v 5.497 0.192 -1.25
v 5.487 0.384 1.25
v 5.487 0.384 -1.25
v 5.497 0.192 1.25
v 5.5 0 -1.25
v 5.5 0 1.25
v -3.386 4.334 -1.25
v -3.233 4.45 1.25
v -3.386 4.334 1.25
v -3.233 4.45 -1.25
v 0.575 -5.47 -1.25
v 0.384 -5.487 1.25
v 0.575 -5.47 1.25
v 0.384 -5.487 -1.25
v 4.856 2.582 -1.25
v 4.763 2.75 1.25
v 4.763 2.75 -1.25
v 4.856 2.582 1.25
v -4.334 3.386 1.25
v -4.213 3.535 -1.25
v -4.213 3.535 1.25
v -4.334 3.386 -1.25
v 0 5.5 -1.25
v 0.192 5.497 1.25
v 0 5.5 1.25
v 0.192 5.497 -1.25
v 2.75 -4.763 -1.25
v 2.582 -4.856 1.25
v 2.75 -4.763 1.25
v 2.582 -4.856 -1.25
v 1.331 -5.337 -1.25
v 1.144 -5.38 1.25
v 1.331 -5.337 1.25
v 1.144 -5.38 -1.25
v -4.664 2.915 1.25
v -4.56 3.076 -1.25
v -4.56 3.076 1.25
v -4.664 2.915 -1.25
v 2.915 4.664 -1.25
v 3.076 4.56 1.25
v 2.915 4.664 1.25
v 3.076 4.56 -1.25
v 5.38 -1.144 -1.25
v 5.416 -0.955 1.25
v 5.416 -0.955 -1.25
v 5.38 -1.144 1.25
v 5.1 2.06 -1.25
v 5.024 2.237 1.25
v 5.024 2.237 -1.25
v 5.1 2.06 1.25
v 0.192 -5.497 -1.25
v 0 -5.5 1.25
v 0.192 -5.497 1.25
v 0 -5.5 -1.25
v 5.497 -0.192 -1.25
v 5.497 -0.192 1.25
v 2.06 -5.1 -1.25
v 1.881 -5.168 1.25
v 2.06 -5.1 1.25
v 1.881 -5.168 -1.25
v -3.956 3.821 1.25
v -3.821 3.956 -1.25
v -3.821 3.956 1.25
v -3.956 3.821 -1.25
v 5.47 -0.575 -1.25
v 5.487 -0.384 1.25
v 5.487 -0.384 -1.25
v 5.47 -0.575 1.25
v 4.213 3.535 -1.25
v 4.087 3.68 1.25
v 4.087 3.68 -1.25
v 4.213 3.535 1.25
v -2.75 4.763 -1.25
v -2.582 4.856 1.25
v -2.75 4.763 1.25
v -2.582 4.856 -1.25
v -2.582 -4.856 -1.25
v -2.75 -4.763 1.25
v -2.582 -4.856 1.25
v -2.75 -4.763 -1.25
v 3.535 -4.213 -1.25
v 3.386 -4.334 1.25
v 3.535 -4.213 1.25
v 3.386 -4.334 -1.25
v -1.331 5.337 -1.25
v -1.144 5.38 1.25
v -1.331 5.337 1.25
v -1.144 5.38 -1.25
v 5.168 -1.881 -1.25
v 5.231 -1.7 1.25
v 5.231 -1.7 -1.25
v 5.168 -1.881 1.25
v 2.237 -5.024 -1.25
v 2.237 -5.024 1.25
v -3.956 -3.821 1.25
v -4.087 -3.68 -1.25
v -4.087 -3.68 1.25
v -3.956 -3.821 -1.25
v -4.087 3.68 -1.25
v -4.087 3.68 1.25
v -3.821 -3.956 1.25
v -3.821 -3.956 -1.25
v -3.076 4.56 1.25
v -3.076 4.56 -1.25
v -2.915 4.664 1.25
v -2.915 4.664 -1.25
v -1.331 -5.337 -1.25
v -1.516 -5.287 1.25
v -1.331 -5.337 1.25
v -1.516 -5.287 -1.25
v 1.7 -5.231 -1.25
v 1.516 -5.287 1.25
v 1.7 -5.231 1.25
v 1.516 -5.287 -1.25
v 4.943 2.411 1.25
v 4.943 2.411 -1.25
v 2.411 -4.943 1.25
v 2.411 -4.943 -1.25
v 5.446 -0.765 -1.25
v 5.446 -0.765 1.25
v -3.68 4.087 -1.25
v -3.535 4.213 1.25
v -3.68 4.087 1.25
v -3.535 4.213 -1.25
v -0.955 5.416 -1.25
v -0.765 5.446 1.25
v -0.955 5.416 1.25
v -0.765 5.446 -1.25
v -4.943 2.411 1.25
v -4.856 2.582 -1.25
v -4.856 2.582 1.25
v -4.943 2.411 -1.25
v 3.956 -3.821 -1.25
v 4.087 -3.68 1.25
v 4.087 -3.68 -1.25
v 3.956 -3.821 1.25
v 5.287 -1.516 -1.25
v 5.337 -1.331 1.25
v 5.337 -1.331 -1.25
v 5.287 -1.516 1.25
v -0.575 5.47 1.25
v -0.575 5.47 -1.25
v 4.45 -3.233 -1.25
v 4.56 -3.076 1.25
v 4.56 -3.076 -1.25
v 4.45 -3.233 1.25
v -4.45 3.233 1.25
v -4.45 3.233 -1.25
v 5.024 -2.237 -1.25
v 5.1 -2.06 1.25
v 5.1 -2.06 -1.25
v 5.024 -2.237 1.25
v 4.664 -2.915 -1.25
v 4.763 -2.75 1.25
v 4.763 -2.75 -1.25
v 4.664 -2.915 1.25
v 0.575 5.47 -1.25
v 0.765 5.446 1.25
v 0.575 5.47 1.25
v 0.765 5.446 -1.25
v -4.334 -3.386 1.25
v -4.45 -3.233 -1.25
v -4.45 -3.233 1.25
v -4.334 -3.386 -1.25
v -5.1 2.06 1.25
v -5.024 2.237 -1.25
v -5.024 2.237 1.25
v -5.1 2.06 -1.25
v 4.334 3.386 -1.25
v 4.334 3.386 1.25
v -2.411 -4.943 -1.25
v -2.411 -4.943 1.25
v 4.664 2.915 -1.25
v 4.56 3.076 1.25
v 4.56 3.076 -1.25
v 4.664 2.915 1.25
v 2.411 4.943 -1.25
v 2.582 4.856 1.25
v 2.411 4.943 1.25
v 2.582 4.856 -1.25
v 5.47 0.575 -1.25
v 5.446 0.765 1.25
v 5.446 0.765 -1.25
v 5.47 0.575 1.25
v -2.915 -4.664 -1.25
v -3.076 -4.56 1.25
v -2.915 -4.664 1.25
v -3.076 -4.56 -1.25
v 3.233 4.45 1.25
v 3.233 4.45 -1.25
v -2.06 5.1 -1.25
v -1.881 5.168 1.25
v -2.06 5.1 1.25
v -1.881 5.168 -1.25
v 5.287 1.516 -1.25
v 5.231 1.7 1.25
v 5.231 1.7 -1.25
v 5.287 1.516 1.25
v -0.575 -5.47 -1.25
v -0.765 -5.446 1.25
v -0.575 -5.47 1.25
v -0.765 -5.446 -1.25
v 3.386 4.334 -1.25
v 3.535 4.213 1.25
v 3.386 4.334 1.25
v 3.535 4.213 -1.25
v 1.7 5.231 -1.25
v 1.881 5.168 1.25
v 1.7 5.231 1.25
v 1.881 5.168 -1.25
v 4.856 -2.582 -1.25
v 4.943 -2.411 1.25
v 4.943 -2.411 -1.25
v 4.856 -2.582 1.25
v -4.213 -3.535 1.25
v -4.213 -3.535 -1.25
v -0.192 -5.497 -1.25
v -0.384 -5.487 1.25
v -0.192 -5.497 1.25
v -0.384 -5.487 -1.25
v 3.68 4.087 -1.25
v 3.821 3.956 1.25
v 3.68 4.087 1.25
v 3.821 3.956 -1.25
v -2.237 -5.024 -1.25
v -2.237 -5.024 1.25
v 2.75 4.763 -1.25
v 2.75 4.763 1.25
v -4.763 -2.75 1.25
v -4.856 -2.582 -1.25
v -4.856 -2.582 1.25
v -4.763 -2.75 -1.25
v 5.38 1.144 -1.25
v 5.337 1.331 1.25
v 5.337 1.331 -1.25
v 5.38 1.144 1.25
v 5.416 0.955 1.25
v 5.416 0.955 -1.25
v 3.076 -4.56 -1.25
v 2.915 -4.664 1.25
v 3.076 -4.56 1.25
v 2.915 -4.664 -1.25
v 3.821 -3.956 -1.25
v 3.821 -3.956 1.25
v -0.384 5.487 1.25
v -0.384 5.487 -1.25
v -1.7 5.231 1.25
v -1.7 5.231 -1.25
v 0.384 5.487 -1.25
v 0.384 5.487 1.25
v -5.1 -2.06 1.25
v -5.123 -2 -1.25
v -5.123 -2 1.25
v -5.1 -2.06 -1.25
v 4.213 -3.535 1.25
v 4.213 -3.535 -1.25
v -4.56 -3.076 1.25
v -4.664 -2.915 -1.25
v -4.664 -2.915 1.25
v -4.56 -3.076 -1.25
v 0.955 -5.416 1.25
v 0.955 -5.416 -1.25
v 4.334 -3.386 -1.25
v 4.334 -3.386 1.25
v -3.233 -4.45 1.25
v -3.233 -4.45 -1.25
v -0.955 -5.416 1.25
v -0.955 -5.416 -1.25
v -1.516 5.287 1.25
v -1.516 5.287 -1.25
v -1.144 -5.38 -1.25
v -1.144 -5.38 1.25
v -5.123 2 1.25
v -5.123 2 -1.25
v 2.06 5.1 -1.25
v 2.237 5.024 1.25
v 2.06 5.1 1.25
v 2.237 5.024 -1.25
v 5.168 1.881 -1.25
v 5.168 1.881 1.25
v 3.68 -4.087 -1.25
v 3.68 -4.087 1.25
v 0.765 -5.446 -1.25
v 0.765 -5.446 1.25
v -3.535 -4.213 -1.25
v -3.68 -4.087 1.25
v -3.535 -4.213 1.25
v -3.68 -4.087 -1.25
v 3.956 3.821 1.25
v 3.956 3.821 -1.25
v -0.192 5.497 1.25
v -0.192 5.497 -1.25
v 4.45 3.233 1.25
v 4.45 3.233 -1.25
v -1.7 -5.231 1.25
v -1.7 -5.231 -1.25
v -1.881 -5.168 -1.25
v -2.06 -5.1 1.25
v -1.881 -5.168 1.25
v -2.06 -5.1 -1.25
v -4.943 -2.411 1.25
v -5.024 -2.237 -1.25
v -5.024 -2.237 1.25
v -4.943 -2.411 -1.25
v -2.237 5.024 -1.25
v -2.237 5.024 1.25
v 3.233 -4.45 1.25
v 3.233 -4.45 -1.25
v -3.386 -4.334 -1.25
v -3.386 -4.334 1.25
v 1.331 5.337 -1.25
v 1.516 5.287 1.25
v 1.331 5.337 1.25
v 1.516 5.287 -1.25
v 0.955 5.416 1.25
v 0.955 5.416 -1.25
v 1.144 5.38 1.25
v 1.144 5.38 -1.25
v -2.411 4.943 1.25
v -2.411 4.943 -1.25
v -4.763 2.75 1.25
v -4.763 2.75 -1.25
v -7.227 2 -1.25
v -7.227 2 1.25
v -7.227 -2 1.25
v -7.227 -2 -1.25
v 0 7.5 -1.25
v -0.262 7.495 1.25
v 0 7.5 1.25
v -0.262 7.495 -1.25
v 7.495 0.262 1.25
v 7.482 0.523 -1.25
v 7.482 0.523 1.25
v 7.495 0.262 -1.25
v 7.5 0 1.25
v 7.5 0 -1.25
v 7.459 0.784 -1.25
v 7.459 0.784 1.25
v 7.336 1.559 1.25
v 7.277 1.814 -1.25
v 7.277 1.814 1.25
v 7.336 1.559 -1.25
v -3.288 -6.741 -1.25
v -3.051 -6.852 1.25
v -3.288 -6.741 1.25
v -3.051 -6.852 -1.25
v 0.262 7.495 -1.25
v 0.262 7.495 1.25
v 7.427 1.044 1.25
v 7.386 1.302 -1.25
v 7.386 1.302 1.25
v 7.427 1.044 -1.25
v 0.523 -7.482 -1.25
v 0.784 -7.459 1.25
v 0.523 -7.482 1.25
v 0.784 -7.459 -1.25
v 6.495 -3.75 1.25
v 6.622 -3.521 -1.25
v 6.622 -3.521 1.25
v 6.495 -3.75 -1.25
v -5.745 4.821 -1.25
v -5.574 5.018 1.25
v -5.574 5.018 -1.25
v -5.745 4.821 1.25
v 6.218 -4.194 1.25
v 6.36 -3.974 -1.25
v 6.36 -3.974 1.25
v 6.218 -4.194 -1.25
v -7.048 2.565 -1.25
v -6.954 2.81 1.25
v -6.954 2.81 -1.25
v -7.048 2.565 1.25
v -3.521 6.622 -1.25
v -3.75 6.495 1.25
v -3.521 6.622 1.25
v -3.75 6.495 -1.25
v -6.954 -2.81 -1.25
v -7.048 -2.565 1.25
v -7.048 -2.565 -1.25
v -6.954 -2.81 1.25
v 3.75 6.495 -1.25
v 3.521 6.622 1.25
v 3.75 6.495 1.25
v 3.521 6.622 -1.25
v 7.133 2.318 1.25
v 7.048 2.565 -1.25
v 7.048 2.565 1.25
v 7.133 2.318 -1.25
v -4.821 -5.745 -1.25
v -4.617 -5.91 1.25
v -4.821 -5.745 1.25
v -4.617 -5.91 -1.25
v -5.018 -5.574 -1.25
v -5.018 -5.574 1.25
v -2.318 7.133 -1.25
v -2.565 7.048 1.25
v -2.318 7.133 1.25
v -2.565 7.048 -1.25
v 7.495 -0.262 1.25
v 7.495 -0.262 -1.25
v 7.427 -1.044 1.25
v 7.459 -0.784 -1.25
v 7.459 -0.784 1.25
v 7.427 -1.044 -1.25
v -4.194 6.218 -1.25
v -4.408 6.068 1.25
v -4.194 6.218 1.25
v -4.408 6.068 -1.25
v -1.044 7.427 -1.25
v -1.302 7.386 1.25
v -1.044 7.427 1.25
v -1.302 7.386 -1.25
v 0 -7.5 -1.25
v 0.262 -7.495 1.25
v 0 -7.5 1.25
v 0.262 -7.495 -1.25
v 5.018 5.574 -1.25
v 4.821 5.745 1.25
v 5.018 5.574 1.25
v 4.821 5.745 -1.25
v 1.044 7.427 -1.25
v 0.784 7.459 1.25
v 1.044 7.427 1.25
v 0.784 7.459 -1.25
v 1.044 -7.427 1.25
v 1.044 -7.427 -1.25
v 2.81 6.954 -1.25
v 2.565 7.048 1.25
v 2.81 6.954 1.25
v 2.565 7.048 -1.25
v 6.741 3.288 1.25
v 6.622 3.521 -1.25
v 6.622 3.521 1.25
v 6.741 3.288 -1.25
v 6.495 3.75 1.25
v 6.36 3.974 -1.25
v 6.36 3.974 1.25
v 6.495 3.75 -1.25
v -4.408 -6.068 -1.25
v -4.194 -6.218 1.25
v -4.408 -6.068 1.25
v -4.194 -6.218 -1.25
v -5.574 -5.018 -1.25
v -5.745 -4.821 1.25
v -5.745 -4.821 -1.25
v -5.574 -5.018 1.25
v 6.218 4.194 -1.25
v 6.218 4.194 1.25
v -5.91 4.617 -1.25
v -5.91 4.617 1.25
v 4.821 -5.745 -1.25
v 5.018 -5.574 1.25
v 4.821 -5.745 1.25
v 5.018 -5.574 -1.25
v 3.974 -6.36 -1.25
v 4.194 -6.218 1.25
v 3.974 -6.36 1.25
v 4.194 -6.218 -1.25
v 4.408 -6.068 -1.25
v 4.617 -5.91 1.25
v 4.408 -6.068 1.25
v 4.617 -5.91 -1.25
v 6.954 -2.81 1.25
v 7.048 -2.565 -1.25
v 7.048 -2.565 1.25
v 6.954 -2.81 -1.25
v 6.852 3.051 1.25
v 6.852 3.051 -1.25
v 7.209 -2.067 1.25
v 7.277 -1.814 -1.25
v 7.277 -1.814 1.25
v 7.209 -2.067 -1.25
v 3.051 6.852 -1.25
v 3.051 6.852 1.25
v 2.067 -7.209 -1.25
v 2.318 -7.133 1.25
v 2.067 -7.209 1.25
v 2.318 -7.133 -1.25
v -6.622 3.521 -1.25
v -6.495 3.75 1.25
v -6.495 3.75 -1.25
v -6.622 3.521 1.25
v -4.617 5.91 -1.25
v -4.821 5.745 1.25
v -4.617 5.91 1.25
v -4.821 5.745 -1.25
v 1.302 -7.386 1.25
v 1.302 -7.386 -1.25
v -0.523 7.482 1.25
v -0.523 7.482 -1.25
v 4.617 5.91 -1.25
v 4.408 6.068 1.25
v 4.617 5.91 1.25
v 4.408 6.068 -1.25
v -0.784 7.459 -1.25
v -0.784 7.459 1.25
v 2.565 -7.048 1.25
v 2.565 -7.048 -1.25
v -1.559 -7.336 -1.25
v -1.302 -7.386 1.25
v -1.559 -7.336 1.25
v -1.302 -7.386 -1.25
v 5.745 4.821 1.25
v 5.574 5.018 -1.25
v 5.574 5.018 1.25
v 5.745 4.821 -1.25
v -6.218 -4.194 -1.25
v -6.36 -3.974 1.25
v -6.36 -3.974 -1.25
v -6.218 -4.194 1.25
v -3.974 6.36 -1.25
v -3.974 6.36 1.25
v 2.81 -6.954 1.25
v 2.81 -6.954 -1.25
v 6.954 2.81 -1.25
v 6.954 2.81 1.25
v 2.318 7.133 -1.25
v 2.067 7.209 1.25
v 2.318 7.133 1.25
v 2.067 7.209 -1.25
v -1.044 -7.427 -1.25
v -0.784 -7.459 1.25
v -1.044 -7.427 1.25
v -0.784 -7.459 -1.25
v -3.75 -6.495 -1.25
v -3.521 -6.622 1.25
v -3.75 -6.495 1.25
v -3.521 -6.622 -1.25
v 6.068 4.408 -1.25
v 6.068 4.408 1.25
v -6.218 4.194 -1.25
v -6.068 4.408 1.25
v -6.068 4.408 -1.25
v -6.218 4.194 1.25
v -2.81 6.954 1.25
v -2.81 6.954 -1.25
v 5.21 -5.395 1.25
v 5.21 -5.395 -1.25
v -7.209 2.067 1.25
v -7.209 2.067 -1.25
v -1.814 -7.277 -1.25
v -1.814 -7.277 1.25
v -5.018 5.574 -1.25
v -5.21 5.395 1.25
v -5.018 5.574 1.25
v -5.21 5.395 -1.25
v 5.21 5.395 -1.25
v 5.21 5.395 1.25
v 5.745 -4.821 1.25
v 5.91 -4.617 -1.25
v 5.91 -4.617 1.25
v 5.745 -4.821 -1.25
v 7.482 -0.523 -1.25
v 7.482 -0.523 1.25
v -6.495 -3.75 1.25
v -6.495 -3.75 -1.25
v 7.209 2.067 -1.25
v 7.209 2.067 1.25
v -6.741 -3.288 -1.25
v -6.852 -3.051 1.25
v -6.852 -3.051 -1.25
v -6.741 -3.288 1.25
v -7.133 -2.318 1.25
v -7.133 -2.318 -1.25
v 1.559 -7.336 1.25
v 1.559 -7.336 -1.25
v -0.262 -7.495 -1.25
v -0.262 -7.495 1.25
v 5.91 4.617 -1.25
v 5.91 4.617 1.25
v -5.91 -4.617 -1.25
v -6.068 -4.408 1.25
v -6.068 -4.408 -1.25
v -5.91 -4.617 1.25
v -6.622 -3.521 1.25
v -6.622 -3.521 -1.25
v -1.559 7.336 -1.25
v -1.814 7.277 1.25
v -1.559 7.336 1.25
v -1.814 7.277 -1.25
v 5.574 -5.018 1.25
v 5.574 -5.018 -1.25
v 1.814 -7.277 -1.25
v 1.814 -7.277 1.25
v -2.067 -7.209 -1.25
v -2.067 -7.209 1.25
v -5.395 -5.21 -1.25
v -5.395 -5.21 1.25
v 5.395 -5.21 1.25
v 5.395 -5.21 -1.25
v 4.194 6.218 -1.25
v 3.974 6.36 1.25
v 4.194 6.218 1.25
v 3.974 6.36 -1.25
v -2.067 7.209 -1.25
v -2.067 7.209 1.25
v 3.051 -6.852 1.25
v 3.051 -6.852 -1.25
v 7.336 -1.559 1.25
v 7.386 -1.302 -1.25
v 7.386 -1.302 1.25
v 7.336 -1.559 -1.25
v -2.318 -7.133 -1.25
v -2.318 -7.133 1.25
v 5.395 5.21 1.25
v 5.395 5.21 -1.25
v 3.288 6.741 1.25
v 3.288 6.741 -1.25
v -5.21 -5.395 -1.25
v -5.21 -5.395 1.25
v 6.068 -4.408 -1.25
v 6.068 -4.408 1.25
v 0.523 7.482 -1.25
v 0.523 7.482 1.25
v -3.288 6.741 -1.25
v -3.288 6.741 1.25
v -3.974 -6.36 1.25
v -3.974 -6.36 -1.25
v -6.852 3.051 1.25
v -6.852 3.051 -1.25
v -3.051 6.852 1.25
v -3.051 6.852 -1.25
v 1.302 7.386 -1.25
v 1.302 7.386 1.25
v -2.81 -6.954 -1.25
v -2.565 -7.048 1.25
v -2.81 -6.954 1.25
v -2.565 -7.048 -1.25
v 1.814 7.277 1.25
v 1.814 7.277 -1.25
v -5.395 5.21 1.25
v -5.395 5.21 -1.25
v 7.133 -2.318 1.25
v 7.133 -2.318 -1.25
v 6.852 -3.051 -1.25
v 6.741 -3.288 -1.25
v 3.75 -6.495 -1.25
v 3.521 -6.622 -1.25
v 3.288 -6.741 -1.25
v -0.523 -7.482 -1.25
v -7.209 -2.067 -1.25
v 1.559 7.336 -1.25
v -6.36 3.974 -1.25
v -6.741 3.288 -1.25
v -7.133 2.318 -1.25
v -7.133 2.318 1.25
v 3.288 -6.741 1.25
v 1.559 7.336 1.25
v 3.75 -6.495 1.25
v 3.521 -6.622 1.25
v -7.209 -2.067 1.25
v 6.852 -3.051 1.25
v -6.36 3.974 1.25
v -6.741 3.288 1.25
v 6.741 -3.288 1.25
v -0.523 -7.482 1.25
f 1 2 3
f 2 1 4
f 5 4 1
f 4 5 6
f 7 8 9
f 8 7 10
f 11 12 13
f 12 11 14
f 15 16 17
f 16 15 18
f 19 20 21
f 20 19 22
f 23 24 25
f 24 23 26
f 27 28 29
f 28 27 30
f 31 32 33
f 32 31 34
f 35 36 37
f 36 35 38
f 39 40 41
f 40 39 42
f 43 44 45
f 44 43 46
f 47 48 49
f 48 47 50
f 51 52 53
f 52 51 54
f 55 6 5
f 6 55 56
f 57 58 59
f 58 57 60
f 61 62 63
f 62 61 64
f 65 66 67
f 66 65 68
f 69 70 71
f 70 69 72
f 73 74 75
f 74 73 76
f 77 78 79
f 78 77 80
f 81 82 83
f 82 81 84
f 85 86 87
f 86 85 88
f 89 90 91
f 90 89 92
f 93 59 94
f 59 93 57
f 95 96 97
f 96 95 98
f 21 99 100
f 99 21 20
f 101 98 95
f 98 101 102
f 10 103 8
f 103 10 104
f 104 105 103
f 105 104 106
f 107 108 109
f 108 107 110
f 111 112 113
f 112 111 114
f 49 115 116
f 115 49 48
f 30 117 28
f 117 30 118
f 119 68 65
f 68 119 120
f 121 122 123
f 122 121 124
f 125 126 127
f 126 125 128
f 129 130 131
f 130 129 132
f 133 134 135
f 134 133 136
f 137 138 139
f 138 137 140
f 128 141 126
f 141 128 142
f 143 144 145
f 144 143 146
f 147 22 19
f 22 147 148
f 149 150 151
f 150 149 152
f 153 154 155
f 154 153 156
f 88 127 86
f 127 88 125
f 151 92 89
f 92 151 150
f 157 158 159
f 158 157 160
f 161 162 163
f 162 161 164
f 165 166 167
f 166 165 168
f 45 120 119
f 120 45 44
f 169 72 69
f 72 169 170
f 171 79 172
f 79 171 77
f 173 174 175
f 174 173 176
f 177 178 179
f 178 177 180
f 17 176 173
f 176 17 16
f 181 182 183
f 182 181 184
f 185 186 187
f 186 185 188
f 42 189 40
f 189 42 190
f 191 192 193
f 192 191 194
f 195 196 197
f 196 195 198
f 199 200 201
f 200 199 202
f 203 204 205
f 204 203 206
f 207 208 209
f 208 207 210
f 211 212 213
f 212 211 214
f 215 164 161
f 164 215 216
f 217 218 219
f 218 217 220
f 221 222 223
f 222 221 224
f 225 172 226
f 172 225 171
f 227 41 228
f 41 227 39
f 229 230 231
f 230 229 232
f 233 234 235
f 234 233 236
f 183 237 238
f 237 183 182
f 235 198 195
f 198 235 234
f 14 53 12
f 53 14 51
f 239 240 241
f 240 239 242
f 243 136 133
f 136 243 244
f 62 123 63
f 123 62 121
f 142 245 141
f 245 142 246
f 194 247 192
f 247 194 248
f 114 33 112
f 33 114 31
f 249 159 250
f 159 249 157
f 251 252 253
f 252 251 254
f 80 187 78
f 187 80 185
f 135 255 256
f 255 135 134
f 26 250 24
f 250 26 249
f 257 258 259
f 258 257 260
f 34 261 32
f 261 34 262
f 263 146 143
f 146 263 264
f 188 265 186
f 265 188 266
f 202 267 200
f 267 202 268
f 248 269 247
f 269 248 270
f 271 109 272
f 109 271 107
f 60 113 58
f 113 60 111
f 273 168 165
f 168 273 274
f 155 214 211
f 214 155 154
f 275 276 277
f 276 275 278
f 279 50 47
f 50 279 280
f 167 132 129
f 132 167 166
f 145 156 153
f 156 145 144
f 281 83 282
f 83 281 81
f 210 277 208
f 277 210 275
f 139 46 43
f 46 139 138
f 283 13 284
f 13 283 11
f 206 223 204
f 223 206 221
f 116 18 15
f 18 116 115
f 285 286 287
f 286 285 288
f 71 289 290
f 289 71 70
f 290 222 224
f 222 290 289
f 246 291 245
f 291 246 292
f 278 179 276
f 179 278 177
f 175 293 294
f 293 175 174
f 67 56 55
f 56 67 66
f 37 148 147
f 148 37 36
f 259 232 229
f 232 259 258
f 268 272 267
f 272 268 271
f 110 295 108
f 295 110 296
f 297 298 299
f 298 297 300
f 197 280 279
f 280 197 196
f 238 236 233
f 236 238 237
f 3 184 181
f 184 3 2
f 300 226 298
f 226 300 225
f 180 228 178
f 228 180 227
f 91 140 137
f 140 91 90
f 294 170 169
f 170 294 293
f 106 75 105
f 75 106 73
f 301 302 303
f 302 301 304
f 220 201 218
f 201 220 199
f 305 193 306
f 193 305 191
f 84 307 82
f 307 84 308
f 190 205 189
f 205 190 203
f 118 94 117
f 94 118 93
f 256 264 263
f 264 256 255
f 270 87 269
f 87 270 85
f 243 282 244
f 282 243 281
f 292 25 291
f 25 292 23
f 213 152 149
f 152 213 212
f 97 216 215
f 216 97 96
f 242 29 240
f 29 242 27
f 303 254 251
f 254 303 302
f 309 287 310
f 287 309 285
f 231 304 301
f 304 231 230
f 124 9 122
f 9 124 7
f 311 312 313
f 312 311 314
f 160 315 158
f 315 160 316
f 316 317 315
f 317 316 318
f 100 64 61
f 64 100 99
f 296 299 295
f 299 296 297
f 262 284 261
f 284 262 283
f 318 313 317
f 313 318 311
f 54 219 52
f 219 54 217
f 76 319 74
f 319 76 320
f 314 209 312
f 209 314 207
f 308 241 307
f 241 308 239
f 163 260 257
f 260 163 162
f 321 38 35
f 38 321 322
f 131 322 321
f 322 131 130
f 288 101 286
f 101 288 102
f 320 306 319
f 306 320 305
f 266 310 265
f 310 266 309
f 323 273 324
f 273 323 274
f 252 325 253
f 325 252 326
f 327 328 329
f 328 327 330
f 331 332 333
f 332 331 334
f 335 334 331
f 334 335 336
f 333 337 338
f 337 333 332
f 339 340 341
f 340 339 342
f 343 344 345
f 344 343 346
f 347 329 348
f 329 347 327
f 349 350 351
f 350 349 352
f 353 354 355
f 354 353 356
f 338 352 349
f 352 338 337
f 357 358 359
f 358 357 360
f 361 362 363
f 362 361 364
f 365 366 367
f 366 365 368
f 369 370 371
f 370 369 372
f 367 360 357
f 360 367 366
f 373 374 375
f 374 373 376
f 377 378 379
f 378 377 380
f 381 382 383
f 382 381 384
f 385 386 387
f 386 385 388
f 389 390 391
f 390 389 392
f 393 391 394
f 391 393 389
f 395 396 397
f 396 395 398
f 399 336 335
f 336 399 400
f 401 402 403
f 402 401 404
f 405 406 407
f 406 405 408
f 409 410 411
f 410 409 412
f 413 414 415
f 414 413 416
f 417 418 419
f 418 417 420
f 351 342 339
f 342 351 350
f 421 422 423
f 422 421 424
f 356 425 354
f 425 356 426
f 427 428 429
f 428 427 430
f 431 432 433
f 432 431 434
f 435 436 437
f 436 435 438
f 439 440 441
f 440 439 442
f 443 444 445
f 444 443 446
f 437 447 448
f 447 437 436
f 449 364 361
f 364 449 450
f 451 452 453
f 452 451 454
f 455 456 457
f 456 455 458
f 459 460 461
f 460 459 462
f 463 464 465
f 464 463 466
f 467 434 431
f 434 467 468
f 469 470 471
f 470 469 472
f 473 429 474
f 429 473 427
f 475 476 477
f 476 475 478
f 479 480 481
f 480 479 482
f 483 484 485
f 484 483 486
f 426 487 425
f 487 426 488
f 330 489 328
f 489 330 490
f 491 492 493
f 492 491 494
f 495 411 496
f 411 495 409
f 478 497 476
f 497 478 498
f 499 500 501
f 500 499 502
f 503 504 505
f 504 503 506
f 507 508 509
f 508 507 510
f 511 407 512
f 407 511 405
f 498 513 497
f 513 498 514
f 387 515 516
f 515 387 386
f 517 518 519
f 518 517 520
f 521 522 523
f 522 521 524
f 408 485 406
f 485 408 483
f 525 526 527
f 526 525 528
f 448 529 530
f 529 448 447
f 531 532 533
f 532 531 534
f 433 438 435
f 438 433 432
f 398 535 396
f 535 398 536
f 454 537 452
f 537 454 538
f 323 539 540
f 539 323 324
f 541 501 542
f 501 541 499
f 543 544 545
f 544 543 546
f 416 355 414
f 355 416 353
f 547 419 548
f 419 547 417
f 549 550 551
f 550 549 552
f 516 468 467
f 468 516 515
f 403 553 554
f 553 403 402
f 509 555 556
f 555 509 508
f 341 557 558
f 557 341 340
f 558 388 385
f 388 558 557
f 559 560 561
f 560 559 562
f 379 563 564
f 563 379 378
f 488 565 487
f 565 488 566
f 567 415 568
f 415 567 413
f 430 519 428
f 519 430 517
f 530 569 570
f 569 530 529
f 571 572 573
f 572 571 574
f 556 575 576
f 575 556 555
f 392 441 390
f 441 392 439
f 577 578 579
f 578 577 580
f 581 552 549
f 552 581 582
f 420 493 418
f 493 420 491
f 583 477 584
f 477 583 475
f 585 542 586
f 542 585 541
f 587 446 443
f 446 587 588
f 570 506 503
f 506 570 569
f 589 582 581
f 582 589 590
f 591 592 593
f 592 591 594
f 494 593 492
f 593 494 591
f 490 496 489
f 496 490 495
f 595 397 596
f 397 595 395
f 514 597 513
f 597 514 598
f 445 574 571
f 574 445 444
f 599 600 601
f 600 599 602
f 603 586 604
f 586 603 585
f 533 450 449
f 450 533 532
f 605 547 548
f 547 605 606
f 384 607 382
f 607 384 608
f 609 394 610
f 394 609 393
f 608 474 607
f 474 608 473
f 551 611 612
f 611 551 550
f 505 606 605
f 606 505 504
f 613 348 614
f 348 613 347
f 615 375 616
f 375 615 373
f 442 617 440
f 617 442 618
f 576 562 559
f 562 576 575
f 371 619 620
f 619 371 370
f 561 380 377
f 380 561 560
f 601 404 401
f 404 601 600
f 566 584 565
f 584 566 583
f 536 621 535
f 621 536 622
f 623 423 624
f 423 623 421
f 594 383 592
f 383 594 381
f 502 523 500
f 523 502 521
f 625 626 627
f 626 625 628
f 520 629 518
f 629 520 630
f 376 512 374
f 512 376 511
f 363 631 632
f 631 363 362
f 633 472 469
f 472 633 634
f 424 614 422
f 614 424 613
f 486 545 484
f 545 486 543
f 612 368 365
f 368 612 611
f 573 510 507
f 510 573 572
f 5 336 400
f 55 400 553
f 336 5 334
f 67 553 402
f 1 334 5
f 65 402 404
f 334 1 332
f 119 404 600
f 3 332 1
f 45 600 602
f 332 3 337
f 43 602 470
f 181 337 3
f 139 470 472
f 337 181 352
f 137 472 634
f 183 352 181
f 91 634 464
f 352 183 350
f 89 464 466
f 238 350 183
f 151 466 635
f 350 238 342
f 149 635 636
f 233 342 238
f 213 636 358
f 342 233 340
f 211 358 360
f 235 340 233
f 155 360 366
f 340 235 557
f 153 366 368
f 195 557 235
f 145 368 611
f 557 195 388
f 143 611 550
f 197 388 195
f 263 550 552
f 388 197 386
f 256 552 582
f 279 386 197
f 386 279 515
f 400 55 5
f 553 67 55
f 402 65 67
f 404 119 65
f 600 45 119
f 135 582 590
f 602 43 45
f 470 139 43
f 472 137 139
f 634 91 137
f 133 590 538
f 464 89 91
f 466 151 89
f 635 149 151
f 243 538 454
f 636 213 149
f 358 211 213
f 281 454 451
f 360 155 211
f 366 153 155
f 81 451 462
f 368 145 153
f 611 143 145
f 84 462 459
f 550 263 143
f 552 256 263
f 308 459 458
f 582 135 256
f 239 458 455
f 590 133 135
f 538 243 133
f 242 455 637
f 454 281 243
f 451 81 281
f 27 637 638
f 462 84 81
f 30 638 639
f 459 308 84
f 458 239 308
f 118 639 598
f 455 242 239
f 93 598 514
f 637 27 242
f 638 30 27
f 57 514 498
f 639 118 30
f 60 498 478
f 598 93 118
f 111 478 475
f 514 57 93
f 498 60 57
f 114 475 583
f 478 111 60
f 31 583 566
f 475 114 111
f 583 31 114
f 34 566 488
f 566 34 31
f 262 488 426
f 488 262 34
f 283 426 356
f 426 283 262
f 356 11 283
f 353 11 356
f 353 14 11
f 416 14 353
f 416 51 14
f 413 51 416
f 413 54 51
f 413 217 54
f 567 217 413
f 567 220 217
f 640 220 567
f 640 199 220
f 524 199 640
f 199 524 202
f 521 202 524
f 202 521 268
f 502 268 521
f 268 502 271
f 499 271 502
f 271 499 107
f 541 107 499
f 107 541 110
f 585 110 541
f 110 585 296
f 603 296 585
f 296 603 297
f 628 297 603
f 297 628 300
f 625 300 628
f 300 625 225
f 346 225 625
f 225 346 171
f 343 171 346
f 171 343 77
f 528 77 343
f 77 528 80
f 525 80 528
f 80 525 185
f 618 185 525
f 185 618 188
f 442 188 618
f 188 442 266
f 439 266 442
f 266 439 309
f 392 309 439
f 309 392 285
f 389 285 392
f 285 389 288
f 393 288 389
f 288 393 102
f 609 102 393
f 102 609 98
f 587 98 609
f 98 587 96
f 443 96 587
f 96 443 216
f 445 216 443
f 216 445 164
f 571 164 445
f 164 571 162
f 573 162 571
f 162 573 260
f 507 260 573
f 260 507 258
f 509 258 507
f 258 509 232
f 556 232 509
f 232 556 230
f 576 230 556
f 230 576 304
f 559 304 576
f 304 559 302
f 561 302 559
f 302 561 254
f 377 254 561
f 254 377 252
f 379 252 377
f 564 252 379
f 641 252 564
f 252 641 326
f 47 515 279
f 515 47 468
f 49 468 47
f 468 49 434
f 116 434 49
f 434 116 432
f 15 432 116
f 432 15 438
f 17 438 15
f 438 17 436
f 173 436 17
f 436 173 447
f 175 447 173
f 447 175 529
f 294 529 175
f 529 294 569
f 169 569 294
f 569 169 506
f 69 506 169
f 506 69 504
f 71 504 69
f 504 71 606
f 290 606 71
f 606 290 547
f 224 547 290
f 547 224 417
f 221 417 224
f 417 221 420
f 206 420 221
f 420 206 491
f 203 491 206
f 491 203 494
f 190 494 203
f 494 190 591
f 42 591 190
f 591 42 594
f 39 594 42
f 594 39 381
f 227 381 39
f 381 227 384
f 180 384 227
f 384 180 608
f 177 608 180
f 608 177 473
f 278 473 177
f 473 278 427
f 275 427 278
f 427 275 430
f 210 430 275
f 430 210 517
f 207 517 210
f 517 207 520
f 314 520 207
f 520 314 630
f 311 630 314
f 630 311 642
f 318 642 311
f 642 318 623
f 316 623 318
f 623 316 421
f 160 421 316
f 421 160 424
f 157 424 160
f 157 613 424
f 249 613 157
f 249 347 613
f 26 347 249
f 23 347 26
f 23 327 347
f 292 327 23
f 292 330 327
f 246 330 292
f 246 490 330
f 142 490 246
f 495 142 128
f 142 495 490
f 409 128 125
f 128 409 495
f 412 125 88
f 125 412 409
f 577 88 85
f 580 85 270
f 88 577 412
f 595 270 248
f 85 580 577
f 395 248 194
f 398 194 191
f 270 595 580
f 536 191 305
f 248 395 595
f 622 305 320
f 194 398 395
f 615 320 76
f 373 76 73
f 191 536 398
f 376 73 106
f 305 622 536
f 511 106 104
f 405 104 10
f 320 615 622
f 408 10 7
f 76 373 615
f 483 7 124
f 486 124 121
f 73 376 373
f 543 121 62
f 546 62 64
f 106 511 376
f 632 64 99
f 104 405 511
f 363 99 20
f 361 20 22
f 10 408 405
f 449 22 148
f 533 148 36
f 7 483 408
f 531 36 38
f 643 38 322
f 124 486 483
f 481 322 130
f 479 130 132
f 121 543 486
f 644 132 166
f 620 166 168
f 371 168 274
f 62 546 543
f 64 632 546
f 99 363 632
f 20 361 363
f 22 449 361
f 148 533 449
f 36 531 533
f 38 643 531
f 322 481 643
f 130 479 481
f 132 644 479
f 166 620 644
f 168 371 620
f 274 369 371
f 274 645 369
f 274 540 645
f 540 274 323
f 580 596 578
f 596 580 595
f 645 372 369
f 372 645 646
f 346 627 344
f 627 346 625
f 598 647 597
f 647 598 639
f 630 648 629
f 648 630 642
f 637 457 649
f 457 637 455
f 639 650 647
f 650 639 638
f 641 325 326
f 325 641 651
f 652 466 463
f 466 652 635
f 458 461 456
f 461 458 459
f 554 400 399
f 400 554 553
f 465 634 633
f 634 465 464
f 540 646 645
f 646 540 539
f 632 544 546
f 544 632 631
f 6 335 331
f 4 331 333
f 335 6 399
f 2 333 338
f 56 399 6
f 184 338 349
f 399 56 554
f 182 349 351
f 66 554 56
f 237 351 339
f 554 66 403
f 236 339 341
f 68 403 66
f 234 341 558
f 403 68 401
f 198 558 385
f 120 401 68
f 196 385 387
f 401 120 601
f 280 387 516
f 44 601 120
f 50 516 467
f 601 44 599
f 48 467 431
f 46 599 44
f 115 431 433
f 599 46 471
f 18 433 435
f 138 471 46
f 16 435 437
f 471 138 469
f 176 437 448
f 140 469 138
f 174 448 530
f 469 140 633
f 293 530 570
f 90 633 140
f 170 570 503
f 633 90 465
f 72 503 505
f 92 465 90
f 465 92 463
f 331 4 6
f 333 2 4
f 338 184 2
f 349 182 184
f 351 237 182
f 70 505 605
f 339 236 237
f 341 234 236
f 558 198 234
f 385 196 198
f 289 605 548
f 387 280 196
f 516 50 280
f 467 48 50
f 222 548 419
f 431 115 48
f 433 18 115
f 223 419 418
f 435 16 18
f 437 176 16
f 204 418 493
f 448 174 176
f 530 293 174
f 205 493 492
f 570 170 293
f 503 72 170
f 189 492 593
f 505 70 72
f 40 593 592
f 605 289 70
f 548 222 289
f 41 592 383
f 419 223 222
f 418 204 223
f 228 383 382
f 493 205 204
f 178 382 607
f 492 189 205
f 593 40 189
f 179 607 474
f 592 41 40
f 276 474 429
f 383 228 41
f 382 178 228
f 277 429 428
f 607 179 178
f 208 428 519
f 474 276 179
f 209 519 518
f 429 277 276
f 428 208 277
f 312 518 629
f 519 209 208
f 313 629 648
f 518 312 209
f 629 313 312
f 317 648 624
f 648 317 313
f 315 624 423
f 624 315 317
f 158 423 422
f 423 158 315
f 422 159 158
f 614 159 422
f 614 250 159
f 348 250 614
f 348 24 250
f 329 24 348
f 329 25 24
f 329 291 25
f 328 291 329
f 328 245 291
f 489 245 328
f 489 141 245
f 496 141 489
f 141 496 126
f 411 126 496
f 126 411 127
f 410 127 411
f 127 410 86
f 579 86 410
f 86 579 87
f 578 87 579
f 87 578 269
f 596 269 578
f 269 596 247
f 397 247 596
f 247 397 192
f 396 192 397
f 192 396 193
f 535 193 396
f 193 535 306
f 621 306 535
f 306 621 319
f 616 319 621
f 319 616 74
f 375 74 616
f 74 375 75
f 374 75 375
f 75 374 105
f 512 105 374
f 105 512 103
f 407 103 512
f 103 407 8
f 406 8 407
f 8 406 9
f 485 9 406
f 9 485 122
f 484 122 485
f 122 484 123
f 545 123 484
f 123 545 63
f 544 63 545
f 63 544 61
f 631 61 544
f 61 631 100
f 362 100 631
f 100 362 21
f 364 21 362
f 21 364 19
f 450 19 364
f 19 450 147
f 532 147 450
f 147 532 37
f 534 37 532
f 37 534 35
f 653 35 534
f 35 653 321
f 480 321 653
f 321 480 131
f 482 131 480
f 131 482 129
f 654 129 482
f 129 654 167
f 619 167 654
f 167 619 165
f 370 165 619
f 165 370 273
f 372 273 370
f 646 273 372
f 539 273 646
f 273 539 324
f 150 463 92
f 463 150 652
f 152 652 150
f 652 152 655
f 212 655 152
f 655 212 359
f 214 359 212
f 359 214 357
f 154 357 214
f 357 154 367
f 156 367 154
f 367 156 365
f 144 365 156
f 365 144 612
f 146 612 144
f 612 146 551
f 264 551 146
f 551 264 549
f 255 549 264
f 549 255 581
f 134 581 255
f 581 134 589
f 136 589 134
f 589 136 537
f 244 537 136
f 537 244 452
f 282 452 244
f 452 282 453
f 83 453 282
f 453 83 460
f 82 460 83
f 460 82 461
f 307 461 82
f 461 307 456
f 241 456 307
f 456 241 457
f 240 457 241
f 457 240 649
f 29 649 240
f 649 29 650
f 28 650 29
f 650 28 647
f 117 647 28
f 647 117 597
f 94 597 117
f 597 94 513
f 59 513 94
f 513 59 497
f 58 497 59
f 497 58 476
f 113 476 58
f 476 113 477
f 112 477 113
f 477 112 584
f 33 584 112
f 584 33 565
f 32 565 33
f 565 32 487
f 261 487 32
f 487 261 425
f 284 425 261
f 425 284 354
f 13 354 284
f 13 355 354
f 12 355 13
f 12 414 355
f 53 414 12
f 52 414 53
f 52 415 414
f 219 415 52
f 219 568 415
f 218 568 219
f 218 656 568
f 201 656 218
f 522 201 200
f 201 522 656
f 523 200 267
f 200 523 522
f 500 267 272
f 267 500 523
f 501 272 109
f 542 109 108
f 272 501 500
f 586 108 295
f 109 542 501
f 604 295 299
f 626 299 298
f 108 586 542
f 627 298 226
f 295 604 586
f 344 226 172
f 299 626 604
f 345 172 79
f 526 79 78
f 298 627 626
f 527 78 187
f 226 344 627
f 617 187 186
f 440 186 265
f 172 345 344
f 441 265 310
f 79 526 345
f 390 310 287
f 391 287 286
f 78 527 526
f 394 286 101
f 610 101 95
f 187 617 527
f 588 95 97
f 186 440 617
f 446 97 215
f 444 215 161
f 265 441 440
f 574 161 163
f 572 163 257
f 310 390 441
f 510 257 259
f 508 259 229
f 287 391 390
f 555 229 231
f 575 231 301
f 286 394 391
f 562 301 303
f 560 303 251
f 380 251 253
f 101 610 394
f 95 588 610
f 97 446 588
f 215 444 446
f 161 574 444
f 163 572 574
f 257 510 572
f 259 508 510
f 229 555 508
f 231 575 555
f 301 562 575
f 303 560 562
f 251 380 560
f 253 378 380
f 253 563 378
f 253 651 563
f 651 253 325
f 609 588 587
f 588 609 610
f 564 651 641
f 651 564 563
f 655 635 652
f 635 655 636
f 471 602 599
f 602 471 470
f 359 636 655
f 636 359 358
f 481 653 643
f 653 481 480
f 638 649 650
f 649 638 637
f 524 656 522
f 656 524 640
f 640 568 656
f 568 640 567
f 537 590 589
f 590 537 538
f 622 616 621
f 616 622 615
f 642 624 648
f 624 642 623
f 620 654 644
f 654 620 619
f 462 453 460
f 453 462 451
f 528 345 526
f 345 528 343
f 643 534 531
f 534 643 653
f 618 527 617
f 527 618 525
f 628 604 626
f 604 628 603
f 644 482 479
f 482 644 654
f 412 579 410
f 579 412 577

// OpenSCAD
difference() {
    union() {
        cylinder(r=7.5, h=2.5, $fn=180, center=true);
    }
    union() {
        cylinder(r=5.5, h=3.0, $fn=180, center=true);
        translate([-6, 0, 0]) cube([4, 4, 4], center=true);
    }
}
